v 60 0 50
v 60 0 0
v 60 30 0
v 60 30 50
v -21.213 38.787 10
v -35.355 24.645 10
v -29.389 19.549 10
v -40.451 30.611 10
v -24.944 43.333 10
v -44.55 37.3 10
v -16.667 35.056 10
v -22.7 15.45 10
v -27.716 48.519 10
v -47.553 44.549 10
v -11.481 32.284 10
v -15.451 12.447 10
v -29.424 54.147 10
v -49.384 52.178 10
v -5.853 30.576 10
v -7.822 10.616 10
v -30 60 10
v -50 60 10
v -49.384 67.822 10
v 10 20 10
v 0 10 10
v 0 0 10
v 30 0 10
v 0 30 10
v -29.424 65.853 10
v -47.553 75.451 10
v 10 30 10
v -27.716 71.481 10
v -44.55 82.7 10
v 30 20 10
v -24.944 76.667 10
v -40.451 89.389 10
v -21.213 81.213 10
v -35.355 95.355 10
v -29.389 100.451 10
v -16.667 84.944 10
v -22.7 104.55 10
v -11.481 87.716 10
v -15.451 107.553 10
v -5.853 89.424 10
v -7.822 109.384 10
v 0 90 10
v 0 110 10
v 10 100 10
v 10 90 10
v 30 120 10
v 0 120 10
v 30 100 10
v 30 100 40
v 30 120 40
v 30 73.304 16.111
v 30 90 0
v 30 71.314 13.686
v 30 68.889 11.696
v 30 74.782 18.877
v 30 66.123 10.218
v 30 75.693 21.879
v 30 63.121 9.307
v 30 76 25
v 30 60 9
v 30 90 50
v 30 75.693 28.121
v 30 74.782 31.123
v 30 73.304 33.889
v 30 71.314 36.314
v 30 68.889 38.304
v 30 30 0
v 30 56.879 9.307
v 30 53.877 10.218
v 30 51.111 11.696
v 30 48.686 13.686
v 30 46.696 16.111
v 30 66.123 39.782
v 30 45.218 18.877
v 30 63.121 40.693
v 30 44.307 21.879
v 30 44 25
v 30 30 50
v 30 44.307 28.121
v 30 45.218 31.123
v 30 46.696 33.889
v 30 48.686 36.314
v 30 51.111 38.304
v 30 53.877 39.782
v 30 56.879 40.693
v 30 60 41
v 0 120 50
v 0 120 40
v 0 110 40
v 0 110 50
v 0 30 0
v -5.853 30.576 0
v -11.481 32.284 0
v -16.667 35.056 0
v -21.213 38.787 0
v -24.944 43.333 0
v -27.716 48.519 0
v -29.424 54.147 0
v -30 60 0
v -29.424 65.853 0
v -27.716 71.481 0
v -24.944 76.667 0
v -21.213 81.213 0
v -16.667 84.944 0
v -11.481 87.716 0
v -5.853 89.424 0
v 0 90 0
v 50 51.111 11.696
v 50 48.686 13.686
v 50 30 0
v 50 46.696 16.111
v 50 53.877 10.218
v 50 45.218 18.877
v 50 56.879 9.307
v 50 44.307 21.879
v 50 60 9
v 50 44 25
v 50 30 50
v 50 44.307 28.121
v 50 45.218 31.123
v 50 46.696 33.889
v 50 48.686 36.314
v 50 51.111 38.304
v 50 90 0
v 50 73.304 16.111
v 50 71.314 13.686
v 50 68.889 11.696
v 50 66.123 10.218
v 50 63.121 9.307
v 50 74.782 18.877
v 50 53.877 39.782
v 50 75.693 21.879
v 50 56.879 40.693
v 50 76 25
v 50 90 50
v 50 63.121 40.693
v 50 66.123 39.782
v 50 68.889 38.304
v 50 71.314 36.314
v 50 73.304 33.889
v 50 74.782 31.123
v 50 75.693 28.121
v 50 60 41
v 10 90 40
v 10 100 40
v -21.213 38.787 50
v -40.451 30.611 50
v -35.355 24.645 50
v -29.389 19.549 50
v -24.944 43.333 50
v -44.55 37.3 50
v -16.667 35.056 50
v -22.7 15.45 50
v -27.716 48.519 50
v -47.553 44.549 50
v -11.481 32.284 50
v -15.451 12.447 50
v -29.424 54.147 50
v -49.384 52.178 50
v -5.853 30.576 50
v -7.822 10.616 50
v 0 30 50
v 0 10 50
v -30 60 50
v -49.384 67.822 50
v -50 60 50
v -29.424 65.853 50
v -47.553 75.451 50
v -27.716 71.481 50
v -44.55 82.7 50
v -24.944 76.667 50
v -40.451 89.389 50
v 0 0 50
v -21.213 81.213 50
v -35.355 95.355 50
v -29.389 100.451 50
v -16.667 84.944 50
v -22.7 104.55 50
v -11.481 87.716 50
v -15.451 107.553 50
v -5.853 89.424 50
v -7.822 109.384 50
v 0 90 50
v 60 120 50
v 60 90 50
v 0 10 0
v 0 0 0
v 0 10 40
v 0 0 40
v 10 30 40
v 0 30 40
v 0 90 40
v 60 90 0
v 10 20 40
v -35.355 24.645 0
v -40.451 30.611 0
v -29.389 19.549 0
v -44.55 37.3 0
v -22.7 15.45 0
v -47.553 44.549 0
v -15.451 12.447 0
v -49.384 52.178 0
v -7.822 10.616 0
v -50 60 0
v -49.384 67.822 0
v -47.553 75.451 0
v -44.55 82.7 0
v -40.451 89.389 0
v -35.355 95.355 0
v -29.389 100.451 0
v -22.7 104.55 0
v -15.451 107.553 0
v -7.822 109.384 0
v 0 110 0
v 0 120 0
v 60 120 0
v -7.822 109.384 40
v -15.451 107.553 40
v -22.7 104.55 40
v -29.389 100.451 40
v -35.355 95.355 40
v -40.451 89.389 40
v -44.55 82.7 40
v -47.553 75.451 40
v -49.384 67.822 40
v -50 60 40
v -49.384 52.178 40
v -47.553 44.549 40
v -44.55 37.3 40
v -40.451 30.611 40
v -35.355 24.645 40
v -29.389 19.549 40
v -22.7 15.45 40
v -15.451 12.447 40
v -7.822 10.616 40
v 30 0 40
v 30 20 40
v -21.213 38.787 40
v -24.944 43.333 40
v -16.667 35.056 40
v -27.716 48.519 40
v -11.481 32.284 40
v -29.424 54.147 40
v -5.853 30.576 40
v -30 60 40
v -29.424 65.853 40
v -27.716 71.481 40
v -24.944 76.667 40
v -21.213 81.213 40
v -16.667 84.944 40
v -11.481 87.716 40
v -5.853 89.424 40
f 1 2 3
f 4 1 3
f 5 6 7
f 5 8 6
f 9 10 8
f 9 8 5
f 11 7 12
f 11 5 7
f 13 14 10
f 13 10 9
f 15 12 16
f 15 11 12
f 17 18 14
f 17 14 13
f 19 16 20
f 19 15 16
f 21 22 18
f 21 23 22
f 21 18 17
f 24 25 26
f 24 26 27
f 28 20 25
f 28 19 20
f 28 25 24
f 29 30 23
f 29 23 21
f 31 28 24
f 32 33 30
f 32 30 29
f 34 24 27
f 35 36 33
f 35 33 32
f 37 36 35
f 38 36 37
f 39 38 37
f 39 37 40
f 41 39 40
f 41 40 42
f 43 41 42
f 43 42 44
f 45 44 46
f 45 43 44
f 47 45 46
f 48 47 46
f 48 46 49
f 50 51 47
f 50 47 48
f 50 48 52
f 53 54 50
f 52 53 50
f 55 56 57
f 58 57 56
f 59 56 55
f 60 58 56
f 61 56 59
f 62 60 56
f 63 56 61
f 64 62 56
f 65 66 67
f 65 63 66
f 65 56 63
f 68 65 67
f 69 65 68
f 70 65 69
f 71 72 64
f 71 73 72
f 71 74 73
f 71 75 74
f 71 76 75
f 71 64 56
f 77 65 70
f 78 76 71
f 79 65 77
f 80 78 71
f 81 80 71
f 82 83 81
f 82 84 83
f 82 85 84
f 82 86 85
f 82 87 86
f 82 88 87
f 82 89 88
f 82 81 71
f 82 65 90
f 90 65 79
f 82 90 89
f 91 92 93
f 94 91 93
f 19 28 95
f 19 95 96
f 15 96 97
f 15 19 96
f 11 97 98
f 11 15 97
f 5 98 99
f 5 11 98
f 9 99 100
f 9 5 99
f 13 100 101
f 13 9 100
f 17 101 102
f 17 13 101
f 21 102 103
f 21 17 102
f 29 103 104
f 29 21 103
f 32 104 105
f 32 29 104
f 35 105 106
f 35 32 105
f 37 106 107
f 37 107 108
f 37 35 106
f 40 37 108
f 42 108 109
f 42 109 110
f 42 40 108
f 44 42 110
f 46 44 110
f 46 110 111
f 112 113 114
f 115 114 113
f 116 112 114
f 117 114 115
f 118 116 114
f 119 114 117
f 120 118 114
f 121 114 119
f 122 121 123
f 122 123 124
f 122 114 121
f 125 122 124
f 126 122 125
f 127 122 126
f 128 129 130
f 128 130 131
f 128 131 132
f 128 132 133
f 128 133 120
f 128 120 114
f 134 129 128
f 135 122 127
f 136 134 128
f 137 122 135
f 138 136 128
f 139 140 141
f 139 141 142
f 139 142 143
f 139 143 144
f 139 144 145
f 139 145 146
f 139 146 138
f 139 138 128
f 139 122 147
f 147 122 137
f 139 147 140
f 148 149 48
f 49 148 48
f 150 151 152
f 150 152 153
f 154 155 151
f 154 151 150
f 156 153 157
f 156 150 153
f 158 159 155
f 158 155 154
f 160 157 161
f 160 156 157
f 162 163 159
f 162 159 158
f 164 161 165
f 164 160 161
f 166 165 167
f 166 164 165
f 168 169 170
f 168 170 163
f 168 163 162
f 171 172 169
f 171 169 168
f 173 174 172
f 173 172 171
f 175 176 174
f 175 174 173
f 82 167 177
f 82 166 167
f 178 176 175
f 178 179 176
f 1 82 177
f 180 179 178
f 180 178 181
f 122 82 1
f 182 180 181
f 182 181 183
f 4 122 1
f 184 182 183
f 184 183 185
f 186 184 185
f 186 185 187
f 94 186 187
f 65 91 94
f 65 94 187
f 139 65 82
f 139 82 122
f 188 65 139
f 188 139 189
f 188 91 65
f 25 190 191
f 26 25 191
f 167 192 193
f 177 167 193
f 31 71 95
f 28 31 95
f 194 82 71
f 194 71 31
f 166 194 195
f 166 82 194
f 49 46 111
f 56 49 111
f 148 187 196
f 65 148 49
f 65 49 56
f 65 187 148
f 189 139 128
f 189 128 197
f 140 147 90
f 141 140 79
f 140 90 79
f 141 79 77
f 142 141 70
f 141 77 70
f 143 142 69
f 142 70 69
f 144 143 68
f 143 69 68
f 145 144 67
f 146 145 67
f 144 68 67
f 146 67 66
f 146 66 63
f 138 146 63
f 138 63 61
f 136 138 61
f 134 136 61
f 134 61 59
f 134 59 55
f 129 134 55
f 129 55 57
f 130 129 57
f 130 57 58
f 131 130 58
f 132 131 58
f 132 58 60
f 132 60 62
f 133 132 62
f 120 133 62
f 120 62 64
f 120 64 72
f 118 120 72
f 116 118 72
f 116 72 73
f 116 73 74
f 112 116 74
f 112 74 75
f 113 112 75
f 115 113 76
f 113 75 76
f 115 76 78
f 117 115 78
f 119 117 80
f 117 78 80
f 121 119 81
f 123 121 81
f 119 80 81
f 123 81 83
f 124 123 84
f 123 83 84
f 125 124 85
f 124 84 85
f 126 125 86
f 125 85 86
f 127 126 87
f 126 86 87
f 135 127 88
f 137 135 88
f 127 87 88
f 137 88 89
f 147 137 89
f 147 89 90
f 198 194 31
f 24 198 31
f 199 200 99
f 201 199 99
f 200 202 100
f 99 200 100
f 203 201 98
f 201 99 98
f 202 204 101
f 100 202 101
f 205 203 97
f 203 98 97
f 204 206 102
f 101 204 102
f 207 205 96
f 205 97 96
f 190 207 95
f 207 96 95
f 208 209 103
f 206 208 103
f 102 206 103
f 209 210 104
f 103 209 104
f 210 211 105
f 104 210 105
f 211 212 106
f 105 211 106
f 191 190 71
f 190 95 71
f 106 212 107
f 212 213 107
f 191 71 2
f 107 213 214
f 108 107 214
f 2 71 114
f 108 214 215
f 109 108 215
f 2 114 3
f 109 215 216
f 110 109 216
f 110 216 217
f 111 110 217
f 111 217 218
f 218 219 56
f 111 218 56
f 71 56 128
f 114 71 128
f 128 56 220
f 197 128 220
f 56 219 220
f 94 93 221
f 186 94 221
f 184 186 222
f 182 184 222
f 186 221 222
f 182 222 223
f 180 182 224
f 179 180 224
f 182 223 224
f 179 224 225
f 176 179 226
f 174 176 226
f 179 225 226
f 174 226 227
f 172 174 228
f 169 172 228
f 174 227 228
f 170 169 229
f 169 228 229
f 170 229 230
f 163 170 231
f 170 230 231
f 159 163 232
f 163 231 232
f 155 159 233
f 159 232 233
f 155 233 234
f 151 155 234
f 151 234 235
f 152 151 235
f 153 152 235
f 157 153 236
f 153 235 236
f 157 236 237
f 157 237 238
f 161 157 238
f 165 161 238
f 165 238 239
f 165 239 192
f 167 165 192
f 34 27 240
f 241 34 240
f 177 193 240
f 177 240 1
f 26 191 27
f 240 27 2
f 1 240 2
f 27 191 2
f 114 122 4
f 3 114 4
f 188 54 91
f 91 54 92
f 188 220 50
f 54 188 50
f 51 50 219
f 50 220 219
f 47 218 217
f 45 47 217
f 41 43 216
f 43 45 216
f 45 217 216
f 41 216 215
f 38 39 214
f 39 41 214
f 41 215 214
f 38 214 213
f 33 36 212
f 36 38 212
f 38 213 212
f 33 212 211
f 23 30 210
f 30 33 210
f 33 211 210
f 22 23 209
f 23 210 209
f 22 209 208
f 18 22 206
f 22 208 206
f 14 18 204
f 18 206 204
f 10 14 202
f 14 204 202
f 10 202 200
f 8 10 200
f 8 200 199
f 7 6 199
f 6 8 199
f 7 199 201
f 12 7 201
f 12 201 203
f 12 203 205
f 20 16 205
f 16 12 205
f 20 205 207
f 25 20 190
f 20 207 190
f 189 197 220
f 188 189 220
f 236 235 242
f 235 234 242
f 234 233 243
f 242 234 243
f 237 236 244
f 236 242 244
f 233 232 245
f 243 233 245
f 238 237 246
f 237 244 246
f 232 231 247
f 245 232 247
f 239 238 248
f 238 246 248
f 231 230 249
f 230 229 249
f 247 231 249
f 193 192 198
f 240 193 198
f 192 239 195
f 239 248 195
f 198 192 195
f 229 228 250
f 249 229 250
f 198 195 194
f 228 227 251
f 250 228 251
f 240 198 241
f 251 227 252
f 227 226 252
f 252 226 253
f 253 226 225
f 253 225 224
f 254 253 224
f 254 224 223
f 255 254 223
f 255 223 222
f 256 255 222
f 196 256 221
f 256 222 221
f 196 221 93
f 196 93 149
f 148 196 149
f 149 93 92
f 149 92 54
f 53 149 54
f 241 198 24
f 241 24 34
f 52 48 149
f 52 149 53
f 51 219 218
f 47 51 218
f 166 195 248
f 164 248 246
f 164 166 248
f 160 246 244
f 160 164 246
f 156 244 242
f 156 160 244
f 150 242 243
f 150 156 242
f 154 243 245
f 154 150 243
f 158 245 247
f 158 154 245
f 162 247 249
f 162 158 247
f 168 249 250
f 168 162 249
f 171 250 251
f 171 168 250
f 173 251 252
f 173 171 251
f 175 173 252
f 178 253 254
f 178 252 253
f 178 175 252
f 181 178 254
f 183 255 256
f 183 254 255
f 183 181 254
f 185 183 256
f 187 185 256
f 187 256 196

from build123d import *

# Parameters (mm, degrees)
BOSS_EXTRUDE1_DEPTH = 50
SKETCH2_W           = 10
SKETCH2_H           = 60
CUT_EXTRUDE1_DEPTH  = 50
CUT_EXTRUDE2_DEPTH  = 50
SKETCH4_W           = 60
SKETCH4_H           = 30
CUT_EXTRUDE3_DEPTH  = 177
SKETCH5_R           = 16
CUT_EXTRUDE5_DEPTH  = 177
SKETCH6_W           = 20
SKETCH6_H           = 30
CUT_EXTRUDE6_DEPTH  = 20
SKETCH7_W           = 20
SKETCH7_H           = 30
CUT_EXTRUDE7_DEPTH  = 20


with BuildPart() as part:
    # Sketch1 → Boss-Extrude1 (new body)
    with BuildSketch(Plane.XY):
        with BuildLine():
            Line((0, 120), (0, 110))
            ThreePointArc((0, 110), (-50, 60), (0, 10))
            Line((0, 10), (0, 0))
            Line((0, 0), (60, 0))
            Line((60, 0), (60, 120))
            Line((60, 120), (0, 120))
        make_face()
    extrude(amount=BOSS_EXTRUDE1_DEPTH)

    # Sketch2 → Cut-Extrude1 (cut)
    with BuildSketch(Plane.XY.offset(50)):
        with Locations((55, 60)):
            Rectangle(SKETCH2_W, SKETCH2_H)
    extrude(amount=-CUT_EXTRUDE1_DEPTH, mode=Mode.SUBTRACT)

    # Sketch3 → Cut-Extrude2 (cut)
    with BuildSketch(Plane.XY.offset(50)):
        with BuildLine():
            Line((30, 90), (30, 30))
            Line((30, 30), (0, 30))
            ThreePointArc((0, 30), (-30, 60), (0, 90))
            Line((0, 90), (30, 90))
        make_face()
    extrude(amount=-CUT_EXTRUDE2_DEPTH, mode=Mode.SUBTRACT)

    # Sketch4 → Cut-Extrude3 (cut)
    with BuildSketch(Plane(origin=(0, 120, 0), x_dir=(1, 0, 0), z_dir=(0, 1, 0))):
        with Locations((-20, -25)):
            Rectangle(SKETCH4_W, SKETCH4_H)
    extrude(amount=-CUT_EXTRUDE3_DEPTH, mode=Mode.SUBTRACT)

    # Sketch5 → Cut-Extrude5 (cut)
    with BuildSketch(Plane.ZY.offset(-30)):
        with Locations((25, 60)):
            Circle(SKETCH5_R)
    extrude(amount=-CUT_EXTRUDE5_DEPTH, mode=Mode.SUBTRACT)

    # Sketch6 → Cut-Extrude6 (cut)
    with BuildSketch(Plane(origin=(0, 120, 0), x_dir=(1, 0, 0), z_dir=(0, 1, 0))):
        with Locations((20, -25)):
            Rectangle(SKETCH6_W, SKETCH6_H)
    extrude(amount=-CUT_EXTRUDE6_DEPTH, mode=Mode.SUBTRACT)

    # Sketch7 → Cut-Extrude7 (cut)
    with BuildSketch(Plane.XZ):
        with Locations((20, 25)):
            Rectangle(SKETCH7_W, SKETCH7_H)
    extrude(amount=-CUT_EXTRUDE7_DEPTH, mode=Mode.SUBTRACT)


solid = part.part
